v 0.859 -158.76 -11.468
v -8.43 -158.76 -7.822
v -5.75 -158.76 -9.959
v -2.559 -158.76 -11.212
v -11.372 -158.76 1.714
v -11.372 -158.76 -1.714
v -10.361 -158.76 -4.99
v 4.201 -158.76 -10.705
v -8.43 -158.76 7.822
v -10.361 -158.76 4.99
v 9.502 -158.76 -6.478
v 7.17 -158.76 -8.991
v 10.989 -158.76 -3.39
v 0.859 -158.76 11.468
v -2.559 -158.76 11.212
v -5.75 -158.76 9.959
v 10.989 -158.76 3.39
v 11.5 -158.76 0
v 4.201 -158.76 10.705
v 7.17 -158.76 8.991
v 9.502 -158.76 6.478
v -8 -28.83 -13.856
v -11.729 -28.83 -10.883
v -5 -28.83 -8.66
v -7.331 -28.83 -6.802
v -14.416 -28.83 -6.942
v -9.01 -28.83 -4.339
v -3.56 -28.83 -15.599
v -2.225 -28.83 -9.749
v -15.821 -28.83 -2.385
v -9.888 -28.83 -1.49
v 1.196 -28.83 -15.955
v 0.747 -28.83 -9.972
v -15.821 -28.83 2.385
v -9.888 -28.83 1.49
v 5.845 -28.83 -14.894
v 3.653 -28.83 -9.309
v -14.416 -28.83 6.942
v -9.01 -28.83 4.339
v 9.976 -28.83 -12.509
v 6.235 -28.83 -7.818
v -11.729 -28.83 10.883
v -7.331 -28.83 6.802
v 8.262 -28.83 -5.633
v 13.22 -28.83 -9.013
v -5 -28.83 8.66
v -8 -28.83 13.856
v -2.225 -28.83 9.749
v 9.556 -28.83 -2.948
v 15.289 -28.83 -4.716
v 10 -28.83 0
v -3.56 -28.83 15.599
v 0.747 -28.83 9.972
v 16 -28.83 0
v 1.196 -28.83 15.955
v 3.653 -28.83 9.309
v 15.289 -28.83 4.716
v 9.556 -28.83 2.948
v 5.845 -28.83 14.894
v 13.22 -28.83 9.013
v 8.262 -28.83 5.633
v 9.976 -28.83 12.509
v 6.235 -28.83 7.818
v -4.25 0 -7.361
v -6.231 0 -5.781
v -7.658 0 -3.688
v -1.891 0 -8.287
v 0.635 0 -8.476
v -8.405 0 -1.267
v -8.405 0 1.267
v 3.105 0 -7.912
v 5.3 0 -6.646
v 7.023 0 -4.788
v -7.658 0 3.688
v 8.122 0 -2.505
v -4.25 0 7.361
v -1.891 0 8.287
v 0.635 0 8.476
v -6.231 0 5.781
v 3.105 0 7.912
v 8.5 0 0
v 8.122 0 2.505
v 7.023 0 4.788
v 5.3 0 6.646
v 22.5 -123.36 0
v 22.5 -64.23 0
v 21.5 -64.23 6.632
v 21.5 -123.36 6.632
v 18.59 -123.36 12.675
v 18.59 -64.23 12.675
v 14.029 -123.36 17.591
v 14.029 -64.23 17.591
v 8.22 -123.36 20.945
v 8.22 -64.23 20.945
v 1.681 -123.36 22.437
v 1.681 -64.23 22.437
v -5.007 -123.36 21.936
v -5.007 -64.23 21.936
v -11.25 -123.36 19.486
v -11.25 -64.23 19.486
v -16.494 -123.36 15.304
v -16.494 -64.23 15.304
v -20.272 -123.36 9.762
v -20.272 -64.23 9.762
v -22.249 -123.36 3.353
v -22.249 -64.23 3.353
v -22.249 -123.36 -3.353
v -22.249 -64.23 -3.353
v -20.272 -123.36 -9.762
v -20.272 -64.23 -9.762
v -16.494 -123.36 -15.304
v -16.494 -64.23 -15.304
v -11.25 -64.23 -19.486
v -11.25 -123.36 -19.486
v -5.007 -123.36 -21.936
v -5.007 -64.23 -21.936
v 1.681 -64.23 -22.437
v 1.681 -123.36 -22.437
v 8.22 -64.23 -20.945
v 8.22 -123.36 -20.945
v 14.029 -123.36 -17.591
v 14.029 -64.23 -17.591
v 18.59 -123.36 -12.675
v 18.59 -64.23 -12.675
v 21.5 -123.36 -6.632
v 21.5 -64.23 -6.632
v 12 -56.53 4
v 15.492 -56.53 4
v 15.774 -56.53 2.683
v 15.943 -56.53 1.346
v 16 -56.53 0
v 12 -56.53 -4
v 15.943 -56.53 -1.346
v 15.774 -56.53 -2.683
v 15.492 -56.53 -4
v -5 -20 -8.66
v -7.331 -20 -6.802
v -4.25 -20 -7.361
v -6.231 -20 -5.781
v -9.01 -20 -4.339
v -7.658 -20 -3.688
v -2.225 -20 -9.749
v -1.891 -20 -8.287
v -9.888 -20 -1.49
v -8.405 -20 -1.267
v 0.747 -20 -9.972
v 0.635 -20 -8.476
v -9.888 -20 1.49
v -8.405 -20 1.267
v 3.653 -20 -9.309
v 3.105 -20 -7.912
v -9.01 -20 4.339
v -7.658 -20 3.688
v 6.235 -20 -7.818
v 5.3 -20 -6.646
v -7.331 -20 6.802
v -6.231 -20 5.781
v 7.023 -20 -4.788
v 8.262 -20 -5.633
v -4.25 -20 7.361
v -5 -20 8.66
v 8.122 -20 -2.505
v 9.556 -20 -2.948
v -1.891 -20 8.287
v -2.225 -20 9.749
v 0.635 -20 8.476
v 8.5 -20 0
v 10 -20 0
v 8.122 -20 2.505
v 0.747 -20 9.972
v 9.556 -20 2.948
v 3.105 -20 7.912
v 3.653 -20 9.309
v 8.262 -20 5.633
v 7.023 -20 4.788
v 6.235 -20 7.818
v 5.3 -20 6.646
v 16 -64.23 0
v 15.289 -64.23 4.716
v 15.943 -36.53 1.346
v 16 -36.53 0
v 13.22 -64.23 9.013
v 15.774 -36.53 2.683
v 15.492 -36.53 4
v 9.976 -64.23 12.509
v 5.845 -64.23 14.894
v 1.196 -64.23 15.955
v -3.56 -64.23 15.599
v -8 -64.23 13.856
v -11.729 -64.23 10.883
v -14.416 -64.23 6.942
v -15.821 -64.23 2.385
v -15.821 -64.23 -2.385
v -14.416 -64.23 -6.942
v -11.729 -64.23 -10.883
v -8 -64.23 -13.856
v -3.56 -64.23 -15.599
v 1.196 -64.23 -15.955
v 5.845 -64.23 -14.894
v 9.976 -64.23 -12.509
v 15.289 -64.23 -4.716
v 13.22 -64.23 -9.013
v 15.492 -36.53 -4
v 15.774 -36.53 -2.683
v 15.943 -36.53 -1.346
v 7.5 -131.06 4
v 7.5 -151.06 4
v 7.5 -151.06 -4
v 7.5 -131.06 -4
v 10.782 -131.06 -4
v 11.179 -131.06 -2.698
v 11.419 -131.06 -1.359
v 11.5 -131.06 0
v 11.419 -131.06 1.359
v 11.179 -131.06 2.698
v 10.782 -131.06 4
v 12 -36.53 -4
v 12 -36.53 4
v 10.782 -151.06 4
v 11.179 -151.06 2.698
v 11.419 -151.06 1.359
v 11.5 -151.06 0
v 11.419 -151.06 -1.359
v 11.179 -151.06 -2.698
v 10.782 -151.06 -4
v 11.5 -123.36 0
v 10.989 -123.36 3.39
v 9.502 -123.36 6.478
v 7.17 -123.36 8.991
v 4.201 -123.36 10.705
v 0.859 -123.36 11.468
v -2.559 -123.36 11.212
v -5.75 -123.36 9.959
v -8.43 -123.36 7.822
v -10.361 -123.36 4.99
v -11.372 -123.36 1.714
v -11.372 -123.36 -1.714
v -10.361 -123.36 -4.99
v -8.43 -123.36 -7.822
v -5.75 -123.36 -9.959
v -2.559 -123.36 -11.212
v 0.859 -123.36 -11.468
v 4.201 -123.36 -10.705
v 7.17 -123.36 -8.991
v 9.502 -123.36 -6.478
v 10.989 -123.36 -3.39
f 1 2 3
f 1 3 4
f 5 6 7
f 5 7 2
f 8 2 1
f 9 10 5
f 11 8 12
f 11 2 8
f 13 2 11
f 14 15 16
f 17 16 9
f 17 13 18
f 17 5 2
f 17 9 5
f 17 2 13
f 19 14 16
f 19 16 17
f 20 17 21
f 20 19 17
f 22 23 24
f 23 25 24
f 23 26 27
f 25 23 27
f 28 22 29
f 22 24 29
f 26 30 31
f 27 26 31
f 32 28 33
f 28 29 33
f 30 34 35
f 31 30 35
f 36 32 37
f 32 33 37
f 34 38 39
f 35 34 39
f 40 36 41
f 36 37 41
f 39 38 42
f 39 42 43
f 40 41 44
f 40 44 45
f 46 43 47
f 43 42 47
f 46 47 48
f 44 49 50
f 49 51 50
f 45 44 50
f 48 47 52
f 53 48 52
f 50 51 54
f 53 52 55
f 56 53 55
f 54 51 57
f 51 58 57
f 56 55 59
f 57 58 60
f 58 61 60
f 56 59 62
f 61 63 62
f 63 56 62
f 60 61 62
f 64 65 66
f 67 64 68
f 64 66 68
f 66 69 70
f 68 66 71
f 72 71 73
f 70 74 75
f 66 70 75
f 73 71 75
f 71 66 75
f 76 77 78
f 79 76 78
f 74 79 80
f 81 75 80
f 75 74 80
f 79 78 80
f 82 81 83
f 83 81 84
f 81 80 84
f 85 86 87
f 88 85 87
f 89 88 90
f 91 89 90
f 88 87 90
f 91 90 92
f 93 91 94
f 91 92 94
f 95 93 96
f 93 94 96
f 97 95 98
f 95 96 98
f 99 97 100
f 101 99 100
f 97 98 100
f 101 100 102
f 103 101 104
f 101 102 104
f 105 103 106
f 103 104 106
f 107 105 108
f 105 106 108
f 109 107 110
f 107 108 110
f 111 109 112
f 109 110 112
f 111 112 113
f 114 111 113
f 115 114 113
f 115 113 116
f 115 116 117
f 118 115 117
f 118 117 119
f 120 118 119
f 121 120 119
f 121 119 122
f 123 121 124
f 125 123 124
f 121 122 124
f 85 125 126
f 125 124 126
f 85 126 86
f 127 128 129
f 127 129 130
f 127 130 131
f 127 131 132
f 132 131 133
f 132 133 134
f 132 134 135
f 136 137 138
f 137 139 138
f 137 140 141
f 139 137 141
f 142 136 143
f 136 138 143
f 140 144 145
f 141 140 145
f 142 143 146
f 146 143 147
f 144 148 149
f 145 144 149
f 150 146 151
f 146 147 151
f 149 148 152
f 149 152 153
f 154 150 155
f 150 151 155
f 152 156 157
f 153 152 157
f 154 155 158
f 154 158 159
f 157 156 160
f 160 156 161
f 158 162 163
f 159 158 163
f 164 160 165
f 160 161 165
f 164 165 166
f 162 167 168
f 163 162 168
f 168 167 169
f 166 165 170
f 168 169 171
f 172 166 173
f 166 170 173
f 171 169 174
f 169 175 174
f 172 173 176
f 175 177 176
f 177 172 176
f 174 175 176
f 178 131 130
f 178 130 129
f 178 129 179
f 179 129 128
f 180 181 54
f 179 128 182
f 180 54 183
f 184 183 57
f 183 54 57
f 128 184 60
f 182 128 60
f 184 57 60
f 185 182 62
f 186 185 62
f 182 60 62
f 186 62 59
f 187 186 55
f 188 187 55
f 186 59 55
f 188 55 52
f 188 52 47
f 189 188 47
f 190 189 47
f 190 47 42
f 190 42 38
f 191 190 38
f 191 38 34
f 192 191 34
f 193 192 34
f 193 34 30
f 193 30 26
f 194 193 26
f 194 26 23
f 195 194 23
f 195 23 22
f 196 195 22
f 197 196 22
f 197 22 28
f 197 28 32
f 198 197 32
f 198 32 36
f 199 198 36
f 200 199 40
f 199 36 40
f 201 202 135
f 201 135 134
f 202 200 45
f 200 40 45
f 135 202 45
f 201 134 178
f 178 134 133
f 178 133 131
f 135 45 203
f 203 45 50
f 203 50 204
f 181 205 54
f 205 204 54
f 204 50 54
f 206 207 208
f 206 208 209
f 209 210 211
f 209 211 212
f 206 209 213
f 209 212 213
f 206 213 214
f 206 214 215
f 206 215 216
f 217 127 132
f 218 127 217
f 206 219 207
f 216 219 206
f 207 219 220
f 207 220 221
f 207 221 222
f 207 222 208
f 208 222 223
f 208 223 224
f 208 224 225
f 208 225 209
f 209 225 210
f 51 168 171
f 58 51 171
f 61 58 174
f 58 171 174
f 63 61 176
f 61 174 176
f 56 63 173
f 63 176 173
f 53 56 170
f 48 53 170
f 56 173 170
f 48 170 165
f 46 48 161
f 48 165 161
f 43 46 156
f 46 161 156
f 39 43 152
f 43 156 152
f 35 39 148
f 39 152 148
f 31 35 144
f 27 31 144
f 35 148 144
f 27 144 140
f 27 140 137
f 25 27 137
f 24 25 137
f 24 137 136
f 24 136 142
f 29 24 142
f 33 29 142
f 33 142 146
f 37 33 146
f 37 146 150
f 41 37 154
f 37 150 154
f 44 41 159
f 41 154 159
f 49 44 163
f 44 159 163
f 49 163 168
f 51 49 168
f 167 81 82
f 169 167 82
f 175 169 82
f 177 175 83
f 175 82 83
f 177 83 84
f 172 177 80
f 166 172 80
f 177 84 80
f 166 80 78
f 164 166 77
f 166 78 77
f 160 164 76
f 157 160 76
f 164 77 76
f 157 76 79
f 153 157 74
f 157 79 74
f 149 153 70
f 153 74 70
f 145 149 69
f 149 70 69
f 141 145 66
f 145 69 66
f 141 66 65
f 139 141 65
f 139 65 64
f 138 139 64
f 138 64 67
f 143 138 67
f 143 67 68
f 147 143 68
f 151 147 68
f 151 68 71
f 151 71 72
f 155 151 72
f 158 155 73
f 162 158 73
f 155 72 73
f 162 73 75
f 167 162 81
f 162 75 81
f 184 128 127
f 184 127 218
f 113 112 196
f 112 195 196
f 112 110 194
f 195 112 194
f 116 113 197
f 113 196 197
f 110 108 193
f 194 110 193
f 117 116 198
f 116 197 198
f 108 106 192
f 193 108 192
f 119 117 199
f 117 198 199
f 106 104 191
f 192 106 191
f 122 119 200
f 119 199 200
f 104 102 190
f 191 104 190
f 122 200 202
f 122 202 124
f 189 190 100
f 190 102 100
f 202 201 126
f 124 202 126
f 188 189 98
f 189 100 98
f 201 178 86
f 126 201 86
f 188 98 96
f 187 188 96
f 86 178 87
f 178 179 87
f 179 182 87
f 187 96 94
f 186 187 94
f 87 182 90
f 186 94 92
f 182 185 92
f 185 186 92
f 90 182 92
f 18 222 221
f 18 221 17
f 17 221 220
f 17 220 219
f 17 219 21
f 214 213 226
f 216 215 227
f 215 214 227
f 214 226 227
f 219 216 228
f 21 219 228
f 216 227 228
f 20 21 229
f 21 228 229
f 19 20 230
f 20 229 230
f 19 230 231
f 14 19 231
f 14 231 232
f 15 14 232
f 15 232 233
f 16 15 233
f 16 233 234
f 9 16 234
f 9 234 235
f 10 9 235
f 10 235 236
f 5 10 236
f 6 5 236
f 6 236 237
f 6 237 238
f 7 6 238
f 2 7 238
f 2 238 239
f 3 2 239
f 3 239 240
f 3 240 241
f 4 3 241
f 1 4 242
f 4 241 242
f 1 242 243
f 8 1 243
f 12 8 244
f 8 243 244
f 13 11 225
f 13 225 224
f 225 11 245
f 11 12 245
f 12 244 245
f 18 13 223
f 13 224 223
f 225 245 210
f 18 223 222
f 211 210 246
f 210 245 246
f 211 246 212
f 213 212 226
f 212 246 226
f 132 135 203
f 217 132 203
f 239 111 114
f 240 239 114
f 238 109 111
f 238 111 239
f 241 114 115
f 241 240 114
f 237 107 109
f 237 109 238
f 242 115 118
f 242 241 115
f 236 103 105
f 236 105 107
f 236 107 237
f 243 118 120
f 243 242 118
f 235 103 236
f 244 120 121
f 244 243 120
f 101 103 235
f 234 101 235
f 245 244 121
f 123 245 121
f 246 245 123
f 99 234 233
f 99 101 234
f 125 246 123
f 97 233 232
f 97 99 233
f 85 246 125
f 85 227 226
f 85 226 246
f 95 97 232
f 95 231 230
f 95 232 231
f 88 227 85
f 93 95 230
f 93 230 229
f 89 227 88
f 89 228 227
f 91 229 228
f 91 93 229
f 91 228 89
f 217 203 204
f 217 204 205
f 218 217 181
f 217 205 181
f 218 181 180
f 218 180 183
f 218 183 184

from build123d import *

# Parameters (mm, degrees)
F0_R      = 8.5
F1_DEPTH  = 20
F2_R      = 10
F3_DEPTH  = 8.83
F4_R      = 16
F5_DEPTH  = 35.4
F6_R      = 22.5
F7_DEPTH  = 59.13
F8_R      = 11.5
F9_DEPTH  = 35.4
F12_W     = 20
F12_H     = 4
F13_DEPTH = 4
F15_W     = 20
F15_H     = 4
F16_DEPTH = 4


with BuildPart() as f1:
    # F0 (on Front) → F1 (new body)
    with BuildSketch(Plane.XZ):
        Circle(F0_R)
    extrude(amount=F1_DEPTH)

    # F2 (on face) → F3 (join)
    with BuildSketch(Plane.XZ.offset(20)):
        Circle(F2_R)
    extrude(amount=F3_DEPTH)

    # F4 (on face) → F5 (join)
    with BuildSketch(Plane.XZ.offset(28.83)):
        Circle(F4_R)
    extrude(amount=F5_DEPTH)

    # F6 (on face) → F7 (join)
    with BuildSketch(Plane.XZ.offset(64.23)):
        Circle(F6_R)
    extrude(amount=F7_DEPTH)

    # F8 (on face) → F9 (join)
    with BuildSketch(Plane.XZ.offset(123.36)):
        Circle(F8_R)
    extrude(amount=F9_DEPTH)

    # F12 (on offset) → F13 (cut)
    with BuildSketch(Plane.YZ.offset(11.5)):
        with Locations((-141.06, 2)):
            Rectangle(F12_W, F12_H)
        with Locations((-141.06, -2)):
            Rectangle(F12_W, F12_H)
    extrude(amount=-F13_DEPTH, mode=Mode.SUBTRACT)

    # F15 (on offset) → F16 (cut)
    with BuildSketch(Plane.YZ.offset(16)):
        with Locations((-46.53, -2)):
            Rectangle(F15_W, F15_H)
        with Locations((-46.53, 2)):
            Rectangle(F15_W, F15_H)
    extrude(amount=-F16_DEPTH, mode=Mode.SUBTRACT)


solid = f1.part
